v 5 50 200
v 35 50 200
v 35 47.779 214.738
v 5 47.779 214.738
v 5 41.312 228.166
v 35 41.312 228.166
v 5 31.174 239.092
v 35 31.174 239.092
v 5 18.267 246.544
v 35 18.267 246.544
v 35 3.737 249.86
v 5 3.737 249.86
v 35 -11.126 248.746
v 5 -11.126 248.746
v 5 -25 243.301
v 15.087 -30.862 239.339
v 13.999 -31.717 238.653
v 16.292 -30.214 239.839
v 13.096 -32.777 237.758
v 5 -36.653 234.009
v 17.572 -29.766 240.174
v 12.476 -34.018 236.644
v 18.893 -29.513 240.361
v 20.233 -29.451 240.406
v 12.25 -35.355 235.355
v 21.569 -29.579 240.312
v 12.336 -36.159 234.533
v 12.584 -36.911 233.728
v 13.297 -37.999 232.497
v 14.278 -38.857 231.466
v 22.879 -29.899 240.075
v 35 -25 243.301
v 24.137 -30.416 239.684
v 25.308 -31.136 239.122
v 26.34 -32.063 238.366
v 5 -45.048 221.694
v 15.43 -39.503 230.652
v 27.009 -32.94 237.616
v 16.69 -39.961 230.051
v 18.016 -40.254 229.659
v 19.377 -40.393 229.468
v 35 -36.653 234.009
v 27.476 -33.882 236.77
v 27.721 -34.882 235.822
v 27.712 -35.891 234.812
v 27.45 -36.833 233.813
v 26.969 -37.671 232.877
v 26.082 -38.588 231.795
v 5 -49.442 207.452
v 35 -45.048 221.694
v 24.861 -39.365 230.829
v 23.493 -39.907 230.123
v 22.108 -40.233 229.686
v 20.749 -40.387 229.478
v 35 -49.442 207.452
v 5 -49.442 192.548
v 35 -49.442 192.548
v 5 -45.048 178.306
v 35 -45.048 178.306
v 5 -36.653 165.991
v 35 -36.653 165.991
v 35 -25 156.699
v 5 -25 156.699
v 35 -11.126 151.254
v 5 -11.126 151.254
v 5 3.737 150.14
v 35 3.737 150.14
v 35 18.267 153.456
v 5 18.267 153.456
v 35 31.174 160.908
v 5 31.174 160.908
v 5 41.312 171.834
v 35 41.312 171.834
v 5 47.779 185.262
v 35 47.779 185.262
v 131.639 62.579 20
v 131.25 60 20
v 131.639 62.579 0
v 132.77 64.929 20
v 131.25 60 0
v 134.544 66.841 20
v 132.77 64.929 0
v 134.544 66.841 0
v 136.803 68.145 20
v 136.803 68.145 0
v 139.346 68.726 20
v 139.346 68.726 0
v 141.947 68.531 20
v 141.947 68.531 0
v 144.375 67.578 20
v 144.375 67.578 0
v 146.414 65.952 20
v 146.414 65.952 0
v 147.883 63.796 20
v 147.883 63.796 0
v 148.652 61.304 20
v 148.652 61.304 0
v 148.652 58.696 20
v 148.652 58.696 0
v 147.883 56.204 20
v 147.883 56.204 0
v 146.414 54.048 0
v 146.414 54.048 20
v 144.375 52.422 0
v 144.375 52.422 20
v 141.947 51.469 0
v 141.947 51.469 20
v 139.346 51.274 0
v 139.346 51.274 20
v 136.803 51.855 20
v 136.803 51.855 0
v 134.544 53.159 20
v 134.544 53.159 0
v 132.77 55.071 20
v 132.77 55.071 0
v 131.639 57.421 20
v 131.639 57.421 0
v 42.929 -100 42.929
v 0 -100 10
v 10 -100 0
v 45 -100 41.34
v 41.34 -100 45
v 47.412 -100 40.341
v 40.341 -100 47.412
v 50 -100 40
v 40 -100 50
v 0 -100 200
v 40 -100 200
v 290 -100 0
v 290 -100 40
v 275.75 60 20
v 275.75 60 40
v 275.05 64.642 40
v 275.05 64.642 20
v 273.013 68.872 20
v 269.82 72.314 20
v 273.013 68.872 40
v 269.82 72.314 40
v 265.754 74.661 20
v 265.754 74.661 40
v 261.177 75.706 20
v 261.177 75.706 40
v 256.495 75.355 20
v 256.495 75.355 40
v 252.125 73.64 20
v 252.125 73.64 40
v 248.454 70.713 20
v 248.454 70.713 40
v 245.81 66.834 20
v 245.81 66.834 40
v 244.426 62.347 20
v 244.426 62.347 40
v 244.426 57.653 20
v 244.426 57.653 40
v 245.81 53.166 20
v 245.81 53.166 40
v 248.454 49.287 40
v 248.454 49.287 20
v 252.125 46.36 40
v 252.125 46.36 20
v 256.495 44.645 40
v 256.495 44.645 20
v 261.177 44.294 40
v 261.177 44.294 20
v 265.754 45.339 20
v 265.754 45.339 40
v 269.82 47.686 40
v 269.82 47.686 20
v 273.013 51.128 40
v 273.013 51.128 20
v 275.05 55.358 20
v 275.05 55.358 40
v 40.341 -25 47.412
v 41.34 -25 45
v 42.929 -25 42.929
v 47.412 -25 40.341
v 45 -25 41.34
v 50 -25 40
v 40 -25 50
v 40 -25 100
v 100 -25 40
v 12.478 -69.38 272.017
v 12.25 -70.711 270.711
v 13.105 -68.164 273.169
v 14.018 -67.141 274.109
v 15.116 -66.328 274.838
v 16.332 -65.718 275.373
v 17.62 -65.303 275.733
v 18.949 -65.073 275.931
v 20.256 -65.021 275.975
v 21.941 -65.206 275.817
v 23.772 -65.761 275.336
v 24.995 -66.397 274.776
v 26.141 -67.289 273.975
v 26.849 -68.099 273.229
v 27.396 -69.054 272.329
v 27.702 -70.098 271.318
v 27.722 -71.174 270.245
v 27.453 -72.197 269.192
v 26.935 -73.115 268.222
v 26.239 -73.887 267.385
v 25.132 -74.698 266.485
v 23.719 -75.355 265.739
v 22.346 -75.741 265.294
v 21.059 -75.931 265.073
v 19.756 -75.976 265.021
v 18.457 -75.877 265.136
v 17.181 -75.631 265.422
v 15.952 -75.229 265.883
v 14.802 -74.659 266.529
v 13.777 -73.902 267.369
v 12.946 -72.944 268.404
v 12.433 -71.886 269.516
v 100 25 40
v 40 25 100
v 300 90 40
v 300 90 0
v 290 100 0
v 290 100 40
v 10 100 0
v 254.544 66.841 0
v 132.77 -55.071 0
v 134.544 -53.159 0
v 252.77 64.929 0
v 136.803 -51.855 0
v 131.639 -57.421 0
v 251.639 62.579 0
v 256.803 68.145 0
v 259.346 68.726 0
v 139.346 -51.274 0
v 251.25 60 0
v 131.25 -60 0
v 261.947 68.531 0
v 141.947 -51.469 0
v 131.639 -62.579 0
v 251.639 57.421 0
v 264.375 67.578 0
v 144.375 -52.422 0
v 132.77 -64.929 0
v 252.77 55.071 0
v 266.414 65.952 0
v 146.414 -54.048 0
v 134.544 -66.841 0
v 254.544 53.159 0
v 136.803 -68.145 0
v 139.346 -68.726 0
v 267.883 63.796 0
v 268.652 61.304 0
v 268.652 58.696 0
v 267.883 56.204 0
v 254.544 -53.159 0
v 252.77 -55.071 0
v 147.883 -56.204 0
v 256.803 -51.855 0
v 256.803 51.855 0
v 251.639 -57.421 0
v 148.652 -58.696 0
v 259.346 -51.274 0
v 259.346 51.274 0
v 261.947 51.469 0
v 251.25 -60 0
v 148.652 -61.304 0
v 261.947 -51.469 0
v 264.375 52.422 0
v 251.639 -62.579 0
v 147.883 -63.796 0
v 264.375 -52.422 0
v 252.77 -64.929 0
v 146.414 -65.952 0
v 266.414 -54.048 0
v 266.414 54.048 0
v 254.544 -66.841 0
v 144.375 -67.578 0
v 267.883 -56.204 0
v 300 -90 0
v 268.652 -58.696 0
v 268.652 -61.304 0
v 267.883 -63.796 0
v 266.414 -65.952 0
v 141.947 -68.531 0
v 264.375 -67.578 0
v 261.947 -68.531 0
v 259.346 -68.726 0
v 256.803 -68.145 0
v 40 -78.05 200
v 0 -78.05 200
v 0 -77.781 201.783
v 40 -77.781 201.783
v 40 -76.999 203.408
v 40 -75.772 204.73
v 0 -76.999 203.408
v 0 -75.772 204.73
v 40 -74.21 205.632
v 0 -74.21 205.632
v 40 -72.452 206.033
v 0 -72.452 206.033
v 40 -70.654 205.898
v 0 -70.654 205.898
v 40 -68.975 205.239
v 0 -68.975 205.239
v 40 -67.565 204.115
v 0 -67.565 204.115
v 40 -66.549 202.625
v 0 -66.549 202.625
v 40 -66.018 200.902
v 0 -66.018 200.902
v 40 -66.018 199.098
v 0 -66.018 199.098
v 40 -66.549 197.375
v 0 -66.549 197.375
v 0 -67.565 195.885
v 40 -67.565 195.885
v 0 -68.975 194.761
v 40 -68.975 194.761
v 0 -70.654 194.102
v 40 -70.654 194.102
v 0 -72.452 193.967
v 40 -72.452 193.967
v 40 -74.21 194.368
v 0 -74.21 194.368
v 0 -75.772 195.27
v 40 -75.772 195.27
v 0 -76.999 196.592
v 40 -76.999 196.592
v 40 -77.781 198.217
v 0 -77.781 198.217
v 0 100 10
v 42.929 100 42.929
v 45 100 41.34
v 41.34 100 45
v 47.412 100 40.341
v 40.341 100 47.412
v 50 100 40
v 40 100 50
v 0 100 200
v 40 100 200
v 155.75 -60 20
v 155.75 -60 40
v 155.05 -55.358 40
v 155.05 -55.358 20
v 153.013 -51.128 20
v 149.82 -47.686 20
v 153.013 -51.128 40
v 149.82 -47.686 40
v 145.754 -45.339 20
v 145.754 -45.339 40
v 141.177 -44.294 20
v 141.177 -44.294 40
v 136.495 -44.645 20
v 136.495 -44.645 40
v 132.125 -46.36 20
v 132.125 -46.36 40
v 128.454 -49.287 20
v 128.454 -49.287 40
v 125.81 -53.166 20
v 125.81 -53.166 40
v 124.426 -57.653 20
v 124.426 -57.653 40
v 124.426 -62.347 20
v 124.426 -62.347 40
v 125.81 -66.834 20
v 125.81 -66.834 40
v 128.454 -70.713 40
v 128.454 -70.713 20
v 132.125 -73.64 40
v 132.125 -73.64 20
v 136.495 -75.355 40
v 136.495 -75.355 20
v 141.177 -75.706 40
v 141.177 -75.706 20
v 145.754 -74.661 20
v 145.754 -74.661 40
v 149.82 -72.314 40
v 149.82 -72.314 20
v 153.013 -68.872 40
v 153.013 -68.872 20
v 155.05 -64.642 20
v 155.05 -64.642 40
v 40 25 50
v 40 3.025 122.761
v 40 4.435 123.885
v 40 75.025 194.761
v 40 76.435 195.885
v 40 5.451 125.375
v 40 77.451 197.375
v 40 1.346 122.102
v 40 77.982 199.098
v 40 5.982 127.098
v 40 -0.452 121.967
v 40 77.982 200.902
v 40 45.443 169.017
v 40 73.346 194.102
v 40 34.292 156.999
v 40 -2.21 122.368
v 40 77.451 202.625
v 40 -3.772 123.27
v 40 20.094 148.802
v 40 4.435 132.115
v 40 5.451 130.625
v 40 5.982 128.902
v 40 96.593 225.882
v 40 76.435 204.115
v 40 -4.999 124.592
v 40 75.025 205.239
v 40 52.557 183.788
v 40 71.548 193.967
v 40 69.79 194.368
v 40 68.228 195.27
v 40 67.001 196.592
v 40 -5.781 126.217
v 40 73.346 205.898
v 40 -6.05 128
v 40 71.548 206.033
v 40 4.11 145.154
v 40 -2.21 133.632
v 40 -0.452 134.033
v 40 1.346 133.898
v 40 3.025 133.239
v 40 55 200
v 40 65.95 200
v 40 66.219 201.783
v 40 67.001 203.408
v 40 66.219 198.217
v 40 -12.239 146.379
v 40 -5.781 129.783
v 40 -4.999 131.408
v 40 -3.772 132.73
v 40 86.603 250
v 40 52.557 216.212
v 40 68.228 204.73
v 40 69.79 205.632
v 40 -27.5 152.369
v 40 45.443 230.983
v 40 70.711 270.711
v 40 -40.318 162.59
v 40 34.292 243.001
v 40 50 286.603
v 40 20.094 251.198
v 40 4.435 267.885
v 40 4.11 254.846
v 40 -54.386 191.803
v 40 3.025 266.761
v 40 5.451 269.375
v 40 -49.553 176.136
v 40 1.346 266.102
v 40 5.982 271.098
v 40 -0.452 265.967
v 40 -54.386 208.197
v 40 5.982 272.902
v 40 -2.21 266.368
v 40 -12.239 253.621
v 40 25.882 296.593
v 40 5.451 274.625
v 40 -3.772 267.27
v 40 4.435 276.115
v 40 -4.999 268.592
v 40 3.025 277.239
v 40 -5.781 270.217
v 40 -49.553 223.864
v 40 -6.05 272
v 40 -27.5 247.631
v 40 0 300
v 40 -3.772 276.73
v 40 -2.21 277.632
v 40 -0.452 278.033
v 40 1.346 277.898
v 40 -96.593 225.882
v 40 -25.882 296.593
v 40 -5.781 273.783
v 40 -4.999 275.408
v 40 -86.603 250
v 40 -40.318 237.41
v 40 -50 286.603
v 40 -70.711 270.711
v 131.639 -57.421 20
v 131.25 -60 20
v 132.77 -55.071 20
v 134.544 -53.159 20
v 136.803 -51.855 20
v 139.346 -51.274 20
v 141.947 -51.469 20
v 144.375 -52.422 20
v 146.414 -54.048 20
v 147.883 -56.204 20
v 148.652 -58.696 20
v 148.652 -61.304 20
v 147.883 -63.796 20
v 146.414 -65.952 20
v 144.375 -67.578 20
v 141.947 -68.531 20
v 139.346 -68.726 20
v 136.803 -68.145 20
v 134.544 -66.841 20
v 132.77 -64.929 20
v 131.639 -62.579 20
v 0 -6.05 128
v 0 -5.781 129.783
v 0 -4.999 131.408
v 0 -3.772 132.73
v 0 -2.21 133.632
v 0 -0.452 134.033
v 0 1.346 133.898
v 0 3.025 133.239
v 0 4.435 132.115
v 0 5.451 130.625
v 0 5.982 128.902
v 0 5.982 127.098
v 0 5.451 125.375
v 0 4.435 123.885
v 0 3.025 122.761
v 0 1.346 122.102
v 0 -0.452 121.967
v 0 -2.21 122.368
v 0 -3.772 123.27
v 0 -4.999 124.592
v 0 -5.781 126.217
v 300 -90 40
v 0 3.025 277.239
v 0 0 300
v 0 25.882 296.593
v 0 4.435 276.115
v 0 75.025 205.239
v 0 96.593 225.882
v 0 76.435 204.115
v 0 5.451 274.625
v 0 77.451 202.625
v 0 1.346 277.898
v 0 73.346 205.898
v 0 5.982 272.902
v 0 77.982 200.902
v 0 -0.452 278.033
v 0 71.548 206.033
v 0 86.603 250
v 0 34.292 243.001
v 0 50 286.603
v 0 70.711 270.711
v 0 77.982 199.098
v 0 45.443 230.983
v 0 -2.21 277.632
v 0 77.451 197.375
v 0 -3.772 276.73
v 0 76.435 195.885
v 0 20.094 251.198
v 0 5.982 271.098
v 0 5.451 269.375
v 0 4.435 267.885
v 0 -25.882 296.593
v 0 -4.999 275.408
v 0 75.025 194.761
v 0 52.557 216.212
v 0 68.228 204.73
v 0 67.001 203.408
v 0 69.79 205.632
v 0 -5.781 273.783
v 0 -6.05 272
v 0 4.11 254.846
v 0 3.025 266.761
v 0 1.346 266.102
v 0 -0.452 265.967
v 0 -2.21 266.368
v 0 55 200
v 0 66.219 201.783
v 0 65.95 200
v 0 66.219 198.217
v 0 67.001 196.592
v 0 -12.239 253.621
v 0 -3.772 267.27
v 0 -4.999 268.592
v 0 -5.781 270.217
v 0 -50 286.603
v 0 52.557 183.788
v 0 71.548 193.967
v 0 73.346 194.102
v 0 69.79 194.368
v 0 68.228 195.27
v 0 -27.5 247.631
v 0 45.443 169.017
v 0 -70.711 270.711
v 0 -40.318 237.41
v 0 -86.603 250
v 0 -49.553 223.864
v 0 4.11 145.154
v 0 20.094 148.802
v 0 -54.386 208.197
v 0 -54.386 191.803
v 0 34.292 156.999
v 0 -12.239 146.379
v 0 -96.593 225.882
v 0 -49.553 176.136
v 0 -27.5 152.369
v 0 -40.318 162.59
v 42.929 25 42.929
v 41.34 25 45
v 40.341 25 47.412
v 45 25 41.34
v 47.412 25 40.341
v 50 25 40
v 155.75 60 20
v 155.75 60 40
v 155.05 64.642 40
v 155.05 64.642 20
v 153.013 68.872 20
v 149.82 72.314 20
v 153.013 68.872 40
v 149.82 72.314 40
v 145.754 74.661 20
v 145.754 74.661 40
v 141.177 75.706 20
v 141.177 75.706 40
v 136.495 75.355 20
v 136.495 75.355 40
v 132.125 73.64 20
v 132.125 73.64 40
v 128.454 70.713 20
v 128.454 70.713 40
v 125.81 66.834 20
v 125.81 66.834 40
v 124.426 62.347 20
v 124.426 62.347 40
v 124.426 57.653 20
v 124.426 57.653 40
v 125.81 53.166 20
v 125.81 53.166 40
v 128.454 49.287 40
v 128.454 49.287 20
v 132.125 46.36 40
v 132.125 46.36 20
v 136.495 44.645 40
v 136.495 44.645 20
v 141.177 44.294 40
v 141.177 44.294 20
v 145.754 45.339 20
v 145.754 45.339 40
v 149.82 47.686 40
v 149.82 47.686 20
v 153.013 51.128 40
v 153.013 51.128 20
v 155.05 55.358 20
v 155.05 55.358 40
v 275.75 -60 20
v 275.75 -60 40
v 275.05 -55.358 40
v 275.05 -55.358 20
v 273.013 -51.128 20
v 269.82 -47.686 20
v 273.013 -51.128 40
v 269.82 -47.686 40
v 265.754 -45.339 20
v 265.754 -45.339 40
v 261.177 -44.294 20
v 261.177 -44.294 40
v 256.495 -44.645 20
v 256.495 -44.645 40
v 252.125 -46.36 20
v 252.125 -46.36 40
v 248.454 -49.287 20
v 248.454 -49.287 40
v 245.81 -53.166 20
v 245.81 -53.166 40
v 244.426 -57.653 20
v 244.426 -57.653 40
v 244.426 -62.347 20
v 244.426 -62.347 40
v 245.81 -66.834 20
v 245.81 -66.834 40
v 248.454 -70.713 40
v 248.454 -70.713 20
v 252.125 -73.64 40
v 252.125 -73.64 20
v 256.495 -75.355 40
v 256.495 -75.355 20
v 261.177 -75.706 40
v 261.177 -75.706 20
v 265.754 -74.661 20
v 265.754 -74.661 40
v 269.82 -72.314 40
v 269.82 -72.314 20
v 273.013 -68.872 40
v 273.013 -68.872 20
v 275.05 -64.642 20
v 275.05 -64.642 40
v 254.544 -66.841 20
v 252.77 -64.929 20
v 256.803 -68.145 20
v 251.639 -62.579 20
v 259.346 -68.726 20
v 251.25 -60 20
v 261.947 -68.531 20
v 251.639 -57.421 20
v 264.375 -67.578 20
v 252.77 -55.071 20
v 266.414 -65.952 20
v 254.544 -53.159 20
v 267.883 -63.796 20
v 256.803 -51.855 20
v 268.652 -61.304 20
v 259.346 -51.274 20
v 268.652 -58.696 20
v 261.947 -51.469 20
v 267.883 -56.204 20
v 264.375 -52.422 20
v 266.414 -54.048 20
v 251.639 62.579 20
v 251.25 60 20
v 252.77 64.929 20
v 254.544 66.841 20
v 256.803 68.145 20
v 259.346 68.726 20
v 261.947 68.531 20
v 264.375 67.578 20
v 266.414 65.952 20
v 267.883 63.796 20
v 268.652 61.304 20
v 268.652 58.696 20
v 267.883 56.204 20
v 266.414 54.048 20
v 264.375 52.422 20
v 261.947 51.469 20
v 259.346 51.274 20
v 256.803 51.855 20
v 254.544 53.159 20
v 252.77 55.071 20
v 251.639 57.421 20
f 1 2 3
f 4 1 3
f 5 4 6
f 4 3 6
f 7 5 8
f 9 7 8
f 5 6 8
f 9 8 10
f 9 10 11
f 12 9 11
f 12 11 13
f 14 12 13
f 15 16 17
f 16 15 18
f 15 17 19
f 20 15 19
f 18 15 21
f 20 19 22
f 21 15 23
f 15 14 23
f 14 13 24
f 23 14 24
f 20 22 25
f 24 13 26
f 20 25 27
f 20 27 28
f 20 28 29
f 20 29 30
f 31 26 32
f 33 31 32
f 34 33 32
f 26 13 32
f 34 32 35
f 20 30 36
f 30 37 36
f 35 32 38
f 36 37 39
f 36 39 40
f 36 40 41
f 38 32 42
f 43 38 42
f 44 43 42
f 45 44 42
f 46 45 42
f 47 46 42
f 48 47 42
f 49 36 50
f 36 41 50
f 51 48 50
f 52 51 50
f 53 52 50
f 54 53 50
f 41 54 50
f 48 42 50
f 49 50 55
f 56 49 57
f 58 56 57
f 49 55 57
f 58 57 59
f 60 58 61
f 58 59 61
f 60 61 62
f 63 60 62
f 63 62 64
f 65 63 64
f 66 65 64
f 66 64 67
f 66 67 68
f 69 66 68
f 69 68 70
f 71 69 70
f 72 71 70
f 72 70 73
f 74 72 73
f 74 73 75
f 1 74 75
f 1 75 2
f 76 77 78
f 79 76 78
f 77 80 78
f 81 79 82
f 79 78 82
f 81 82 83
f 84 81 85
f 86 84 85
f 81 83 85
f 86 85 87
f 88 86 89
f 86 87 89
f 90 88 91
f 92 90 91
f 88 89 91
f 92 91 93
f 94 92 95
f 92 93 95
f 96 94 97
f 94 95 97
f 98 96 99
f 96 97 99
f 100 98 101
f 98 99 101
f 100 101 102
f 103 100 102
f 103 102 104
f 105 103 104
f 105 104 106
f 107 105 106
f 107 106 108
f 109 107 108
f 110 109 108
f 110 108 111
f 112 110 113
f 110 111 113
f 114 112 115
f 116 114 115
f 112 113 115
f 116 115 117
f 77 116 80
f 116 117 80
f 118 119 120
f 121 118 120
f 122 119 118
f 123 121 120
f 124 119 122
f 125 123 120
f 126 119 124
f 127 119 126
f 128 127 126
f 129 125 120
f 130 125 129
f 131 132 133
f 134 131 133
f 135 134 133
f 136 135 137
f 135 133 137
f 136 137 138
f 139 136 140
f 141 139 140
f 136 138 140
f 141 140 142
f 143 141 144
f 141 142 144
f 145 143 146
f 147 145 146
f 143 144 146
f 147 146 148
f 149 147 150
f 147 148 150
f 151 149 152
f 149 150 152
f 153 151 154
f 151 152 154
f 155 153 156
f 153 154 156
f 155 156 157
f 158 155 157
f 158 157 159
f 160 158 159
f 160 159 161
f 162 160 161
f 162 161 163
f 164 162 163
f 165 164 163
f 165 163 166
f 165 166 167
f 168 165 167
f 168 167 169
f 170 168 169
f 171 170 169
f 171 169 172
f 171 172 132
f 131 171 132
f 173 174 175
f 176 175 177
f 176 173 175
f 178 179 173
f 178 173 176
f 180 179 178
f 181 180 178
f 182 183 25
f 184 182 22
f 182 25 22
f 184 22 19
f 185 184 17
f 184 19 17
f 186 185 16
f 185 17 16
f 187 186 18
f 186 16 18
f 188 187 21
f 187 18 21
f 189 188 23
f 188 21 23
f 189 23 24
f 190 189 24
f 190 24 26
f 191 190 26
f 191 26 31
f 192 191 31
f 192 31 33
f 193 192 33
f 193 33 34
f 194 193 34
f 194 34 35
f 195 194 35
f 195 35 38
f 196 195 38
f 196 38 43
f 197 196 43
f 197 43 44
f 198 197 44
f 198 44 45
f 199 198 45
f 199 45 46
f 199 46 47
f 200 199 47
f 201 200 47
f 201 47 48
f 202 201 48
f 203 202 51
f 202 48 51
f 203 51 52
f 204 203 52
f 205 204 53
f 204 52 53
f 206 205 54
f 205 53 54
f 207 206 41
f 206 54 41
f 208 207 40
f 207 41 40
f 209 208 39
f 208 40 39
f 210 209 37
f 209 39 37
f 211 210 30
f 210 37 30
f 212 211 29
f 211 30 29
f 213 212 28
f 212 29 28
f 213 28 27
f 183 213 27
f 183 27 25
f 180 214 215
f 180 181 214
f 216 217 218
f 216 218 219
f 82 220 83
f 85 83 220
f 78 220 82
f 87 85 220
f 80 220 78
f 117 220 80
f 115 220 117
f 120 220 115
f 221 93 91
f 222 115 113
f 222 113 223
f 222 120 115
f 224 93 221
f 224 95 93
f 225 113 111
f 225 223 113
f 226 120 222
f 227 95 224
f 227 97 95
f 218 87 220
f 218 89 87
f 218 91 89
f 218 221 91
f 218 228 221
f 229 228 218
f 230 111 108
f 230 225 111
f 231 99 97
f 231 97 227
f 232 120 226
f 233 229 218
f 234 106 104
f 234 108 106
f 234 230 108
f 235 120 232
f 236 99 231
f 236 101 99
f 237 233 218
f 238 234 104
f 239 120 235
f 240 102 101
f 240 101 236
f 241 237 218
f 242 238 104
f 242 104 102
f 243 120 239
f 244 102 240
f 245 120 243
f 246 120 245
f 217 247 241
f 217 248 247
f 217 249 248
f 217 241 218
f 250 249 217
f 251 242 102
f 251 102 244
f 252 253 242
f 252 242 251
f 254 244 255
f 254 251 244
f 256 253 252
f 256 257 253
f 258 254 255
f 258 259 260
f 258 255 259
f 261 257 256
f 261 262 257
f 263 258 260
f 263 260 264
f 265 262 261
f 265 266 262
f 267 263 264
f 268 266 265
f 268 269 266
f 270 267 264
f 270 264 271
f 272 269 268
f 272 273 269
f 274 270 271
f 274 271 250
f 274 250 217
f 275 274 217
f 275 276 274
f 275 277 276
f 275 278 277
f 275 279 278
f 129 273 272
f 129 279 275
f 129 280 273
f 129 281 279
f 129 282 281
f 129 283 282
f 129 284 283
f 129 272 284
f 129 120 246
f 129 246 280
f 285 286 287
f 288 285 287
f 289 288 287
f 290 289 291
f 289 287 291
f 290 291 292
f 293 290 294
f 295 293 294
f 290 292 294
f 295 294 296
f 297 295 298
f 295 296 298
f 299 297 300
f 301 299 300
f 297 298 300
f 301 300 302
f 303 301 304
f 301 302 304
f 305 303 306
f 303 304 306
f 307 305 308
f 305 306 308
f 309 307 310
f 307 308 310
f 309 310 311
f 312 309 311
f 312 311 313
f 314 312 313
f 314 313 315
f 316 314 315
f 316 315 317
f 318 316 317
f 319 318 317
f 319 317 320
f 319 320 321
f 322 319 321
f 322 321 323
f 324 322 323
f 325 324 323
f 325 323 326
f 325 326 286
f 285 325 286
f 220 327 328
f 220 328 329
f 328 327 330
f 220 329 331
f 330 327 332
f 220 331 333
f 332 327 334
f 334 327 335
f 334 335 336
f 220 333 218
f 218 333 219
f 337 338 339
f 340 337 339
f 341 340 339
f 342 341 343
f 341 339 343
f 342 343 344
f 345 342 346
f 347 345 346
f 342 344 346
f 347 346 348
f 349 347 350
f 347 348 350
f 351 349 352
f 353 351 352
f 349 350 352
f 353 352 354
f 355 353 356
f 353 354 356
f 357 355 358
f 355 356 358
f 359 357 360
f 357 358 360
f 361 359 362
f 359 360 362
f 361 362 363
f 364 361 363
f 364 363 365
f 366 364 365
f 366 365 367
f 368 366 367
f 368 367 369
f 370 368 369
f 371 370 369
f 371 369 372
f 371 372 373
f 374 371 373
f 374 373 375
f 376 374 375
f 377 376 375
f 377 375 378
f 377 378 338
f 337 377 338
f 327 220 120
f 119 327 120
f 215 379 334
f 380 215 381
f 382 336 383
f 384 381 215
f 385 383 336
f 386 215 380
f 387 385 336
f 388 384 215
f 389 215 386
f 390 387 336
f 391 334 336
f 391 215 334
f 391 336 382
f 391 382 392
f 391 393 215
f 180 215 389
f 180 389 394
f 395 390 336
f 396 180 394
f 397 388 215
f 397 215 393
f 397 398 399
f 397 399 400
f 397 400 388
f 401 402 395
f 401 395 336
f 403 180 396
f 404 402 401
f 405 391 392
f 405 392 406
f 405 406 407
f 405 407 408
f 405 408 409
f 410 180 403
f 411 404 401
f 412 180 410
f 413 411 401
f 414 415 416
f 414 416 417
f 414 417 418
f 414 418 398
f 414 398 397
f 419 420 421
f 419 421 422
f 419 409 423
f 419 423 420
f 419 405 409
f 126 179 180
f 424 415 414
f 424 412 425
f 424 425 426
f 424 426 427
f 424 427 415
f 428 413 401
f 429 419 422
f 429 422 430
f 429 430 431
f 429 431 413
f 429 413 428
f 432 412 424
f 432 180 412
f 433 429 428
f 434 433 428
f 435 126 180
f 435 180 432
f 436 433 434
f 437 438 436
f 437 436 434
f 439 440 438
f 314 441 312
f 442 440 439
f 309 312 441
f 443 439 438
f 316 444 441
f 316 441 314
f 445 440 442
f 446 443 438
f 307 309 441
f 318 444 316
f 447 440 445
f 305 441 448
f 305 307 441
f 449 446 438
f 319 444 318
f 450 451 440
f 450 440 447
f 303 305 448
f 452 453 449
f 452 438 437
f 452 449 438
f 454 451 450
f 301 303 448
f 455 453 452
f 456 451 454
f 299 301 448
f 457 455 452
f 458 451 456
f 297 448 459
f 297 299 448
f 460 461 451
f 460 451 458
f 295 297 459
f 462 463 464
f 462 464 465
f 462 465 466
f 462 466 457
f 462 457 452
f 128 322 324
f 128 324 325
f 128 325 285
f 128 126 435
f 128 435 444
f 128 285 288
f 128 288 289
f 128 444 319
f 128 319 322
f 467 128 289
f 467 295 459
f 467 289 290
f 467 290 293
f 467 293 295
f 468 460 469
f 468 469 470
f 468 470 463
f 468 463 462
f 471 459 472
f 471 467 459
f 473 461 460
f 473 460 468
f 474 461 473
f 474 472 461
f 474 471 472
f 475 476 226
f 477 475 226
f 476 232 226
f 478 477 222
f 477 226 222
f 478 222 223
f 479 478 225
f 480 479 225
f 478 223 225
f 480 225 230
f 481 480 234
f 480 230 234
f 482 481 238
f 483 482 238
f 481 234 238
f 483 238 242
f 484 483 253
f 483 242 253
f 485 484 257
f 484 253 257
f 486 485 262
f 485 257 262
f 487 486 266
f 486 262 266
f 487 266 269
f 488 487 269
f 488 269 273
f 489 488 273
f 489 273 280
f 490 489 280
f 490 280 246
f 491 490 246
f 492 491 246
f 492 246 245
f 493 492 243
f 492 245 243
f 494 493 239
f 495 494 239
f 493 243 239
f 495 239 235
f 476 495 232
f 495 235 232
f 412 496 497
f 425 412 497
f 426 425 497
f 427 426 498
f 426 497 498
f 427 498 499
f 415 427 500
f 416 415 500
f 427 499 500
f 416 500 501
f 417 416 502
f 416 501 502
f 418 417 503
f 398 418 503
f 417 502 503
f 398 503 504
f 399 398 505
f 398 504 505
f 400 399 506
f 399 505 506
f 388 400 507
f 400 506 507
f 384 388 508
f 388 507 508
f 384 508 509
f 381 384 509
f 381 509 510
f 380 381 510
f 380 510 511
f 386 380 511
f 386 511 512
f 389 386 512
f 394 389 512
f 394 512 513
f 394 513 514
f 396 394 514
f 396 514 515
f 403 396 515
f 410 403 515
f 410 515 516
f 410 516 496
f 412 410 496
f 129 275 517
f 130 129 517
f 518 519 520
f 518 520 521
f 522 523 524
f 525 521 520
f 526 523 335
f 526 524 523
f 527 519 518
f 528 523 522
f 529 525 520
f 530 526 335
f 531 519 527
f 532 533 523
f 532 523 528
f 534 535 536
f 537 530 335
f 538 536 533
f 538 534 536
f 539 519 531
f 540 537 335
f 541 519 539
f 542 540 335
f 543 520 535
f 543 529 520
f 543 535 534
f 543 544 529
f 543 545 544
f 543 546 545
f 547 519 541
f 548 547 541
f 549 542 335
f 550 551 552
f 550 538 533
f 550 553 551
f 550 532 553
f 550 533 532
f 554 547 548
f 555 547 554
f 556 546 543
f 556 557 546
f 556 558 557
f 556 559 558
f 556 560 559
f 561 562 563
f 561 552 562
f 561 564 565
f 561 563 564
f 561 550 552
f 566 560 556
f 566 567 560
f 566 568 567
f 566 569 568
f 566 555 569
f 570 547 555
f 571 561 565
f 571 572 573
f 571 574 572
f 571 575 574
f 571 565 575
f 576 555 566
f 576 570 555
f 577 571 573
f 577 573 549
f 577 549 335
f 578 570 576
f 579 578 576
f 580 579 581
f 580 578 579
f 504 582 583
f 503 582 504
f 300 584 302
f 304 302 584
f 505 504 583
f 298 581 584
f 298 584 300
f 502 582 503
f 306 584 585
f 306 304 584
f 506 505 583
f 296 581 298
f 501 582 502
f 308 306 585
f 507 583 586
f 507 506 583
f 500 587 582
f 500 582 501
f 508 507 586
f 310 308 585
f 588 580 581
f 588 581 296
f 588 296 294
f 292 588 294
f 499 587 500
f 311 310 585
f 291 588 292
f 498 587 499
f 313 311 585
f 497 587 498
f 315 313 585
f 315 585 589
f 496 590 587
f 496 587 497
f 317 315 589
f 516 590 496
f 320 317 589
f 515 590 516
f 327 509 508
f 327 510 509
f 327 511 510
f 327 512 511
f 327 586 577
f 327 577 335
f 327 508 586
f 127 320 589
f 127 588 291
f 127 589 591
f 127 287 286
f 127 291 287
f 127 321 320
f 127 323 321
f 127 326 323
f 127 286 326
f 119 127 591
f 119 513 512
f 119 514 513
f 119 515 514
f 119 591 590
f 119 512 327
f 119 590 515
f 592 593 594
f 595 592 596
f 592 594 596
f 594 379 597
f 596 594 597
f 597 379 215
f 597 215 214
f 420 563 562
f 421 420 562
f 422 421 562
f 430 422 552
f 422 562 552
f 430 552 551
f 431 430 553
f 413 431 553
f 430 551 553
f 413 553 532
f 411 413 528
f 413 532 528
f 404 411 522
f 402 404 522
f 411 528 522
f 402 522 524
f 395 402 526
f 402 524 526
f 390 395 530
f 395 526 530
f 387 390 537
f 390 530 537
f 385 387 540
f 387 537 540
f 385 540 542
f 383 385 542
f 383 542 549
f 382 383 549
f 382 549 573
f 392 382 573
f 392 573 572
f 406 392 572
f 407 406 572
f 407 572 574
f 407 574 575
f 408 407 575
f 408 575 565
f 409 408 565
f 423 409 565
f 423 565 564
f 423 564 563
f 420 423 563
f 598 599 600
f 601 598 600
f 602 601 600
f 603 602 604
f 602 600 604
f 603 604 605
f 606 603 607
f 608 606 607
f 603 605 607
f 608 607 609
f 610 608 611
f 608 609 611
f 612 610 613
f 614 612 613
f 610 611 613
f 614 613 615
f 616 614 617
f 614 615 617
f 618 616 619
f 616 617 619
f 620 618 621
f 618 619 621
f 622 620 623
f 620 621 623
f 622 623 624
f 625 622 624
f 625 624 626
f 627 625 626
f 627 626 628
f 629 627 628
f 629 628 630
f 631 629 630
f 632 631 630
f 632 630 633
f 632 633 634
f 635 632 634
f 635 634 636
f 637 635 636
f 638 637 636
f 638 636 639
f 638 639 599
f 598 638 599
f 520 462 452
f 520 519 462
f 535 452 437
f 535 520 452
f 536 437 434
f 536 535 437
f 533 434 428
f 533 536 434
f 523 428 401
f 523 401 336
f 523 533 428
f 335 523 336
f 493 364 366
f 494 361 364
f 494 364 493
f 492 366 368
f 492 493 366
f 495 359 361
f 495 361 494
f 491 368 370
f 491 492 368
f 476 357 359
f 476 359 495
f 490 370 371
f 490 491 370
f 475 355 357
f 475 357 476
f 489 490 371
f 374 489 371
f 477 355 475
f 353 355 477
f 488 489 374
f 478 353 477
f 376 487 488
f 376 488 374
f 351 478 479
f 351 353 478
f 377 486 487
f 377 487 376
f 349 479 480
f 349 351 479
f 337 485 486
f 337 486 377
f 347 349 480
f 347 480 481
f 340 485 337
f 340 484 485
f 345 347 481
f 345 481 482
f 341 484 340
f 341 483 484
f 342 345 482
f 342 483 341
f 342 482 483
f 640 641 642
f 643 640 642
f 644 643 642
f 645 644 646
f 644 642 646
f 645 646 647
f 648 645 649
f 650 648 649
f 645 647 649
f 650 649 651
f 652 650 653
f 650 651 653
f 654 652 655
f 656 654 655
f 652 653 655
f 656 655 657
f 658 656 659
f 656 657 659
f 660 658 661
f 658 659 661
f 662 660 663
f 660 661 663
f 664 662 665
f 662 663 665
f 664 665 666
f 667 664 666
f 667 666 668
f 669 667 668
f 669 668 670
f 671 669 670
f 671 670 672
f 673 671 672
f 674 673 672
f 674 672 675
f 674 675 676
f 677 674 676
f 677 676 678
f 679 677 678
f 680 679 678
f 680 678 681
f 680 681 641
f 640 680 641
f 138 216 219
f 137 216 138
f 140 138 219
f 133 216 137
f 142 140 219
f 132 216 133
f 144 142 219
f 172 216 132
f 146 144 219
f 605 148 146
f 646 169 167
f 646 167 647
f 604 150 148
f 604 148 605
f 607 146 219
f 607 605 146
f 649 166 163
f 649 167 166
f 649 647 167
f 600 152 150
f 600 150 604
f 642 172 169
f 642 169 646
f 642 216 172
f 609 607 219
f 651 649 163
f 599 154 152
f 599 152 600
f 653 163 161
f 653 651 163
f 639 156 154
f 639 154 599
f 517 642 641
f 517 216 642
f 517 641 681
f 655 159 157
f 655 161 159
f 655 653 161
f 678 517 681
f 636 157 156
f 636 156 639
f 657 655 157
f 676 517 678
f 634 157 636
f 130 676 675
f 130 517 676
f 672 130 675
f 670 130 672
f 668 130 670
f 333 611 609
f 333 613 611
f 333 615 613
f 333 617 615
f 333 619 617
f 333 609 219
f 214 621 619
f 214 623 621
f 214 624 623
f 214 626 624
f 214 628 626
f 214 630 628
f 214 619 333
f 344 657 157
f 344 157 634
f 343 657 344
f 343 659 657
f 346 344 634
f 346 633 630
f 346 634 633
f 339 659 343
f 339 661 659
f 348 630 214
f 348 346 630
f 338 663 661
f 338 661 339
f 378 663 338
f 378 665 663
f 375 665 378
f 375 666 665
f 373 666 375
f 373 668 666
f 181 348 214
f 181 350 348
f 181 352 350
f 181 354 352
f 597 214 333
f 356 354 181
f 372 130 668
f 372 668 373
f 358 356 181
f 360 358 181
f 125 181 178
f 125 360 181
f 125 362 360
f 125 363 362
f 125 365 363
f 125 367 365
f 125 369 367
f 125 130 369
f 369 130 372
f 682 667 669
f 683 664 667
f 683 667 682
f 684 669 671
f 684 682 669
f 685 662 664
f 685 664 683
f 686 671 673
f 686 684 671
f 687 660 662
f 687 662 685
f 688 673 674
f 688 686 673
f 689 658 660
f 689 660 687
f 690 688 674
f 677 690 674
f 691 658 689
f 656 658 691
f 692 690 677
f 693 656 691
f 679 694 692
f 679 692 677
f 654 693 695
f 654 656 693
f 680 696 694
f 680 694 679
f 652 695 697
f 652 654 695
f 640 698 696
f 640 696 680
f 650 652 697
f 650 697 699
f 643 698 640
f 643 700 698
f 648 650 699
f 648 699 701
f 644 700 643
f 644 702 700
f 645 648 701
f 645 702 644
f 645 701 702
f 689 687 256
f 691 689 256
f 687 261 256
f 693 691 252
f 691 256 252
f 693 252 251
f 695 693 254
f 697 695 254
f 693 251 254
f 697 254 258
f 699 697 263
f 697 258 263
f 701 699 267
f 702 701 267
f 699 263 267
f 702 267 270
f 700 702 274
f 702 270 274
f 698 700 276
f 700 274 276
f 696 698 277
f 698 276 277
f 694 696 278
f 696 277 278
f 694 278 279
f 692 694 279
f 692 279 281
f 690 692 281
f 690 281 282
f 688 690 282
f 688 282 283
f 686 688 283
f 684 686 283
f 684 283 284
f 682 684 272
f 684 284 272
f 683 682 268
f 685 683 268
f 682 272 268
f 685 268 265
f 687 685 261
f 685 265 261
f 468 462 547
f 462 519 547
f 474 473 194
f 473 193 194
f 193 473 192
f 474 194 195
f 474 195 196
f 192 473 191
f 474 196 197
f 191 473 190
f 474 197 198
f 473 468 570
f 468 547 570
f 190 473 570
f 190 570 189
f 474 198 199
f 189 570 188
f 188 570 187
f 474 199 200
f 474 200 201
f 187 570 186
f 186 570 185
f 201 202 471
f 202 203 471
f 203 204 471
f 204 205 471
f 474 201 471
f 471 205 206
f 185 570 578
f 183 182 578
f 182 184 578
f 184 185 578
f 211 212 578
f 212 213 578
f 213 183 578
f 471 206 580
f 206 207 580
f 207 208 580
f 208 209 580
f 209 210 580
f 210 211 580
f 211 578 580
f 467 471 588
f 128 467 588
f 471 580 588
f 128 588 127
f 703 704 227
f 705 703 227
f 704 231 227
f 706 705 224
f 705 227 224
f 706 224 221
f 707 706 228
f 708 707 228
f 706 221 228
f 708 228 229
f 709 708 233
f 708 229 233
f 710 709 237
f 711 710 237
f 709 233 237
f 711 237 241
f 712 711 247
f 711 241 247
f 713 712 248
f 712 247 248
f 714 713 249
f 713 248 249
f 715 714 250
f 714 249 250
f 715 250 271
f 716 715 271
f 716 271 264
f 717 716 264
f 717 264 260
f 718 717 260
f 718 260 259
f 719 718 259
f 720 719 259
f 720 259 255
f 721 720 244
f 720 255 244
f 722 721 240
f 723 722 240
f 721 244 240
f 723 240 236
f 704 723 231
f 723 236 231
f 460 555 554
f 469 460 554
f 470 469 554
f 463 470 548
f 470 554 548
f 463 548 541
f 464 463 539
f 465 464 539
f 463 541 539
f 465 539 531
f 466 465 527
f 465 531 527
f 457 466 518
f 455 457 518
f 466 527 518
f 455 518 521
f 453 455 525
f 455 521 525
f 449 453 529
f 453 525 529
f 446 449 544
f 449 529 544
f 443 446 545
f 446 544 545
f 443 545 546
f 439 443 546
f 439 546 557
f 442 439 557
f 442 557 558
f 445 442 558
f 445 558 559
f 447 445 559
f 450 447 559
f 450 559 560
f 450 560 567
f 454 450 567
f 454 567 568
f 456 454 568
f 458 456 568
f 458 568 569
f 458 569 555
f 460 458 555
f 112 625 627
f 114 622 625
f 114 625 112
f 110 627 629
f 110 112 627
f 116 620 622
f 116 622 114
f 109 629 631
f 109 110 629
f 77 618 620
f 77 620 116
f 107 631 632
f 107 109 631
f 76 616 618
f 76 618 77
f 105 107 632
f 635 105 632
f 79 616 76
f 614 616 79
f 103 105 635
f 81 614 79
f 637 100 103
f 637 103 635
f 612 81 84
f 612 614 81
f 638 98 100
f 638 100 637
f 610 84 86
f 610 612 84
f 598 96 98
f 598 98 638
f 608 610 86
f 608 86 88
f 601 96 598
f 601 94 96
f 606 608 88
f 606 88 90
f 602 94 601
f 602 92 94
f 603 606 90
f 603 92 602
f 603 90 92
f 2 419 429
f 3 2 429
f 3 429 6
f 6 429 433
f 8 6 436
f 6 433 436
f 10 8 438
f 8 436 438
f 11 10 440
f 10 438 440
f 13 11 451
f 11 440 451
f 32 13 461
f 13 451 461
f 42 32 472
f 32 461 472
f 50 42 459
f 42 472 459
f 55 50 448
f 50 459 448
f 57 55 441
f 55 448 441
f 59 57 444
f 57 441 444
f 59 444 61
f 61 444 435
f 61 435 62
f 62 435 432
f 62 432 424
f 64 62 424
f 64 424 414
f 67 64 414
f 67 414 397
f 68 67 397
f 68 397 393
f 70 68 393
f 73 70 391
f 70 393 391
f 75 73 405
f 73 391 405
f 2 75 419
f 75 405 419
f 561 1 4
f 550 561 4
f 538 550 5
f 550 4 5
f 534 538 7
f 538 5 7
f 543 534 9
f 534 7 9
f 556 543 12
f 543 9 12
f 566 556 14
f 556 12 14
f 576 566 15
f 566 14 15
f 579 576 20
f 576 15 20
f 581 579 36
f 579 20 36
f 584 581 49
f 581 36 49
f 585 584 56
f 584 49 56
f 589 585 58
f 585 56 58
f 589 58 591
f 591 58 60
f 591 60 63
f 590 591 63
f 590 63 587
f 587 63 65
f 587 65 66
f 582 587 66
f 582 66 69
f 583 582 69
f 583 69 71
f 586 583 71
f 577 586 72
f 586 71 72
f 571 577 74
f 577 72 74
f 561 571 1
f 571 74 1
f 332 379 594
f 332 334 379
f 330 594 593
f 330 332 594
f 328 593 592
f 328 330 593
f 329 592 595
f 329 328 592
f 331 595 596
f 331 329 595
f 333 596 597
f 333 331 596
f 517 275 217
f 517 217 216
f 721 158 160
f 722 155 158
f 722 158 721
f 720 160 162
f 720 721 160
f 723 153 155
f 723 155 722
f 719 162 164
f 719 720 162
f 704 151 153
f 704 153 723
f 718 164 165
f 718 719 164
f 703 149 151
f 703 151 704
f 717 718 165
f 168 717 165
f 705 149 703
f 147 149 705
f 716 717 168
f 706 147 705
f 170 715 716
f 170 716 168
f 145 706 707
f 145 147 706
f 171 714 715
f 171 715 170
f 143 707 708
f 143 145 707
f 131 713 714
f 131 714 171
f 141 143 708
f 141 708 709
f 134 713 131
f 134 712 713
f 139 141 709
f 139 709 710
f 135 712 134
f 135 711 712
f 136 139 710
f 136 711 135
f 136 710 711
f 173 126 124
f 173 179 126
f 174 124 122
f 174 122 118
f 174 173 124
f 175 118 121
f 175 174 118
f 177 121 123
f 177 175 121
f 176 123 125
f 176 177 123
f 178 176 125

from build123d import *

# Parameters (mm, degrees)
F1_DEPTH        = 100
F2_R            = 99.99999
F3_SIZE         = 10
F5_DEPTH        = 25
F6_R            = 50
F7_DEPTH        = 40.001
F10_D           = 12.1
F11_D           = 15.5
F11_DEPTH       = 70
F11_START       = 0.3007608
F11_TIP         = 4.6566697975
F13_D           = 17.5
F13_CBORE_D     = 31.5
F13_CBORE_DEPTH = 20
F14_SIZE        = 5
F15_R           = 10


# Not quite as in the source:
# - a fillet or chamfer is up to 0.001 mm smaller than in the source, because OpenCascade refuses the exact size


with BuildPart() as f1:
    # F0 (on Front) → F1 (new body, symmetric)
    with BuildSketch(Plane.XZ):
        Polygon((40, 300), (0, 300), (0, 0), (300, 0), (300, 40), (40, 40), align=None)
    extrude(amount=F1_DEPTH, both=True)

    # F2 (radius 100 in the source; OpenCascade refuses exactly that, so slightly less here)
    f2_edges = [f1.edges().sort_by_distance(p)[0] for p in [
        (20, -100, 300),
        (20, 100, 300),
    ]]
    fillet(f2_edges, radius=F2_R)

    # F3
    f3_edges = [f1.edges().sort_by_distance(p)[0] for p in [
        (300, -100, 20),
        (300, 100, 20),
        (0, 0, 0),
    ]]
    chamfer(f3_edges, length=F3_SIZE)

    # F4 (on Front) → F5 (join, symmetric)
    with BuildSketch(Plane.XZ):
        Polygon((40, 100), (40, 40), (100, 40), align=None)
    extrude(amount=F5_DEPTH, both=True)

    # F6 (on face) → F7 (cut, through all)
    with BuildSketch(Plane.YZ.offset(40)):
        with Locations((0, 200)):
            Circle(F6_R)
    extrude(amount=-F7_DEPTH, mode=Mode.SUBTRACT)

    # F10 (through all)
    with Locations(Plane.YZ.offset(40)):
        with Locations((0, 272), (72, 200), (0, 128), (-72, 200)):
            Hole(F10_D / 2)

    # F11
    # its depths count from where the whole tool has entered the part; down to there all is cleared
    with Locations(Plane(origin=(0, -170.7106781187, 170.7106781187), x_dir=(1, 0, 0), z_dir=(0, -0.7071067812, 0.7071067812)).offset(-F11_START)):
        with Locations((20, 141.4213562373)):
            Hole(F11_D / 2, depth=F11_DEPTH)
            with Locations((0, 0, -(F11_DEPTH + F11_TIP / 2))):  # 118° drill point
                Cone(0, F11_D / 2, F11_TIP, mode=Mode.SUBTRACT)

    # F13 (through all)
    with Locations(Plane.XY.offset(40)):
        with Locations((140, -60), (140, 60), (260, 60), (260, -60)):
            CounterBoreHole(F13_D / 2, F13_CBORE_D / 2, F13_CBORE_DEPTH)

    # F14
    f14_edges = [f1.edges().sort_by_distance(p)[0] for p in [
        (40, -50, 200),
        (0, -50, 200),
    ]]
    chamfer(f14_edges, length=F14_SIZE)

    # F15
    f15_edges = [f1.edges().sort_by_distance(p)[0] for p in [
        (40, -62.5, 40),
        (40, 62.5, 40),
    ]]
    fillet(f15_edges, radius=F15_R)


solid = f1.part
